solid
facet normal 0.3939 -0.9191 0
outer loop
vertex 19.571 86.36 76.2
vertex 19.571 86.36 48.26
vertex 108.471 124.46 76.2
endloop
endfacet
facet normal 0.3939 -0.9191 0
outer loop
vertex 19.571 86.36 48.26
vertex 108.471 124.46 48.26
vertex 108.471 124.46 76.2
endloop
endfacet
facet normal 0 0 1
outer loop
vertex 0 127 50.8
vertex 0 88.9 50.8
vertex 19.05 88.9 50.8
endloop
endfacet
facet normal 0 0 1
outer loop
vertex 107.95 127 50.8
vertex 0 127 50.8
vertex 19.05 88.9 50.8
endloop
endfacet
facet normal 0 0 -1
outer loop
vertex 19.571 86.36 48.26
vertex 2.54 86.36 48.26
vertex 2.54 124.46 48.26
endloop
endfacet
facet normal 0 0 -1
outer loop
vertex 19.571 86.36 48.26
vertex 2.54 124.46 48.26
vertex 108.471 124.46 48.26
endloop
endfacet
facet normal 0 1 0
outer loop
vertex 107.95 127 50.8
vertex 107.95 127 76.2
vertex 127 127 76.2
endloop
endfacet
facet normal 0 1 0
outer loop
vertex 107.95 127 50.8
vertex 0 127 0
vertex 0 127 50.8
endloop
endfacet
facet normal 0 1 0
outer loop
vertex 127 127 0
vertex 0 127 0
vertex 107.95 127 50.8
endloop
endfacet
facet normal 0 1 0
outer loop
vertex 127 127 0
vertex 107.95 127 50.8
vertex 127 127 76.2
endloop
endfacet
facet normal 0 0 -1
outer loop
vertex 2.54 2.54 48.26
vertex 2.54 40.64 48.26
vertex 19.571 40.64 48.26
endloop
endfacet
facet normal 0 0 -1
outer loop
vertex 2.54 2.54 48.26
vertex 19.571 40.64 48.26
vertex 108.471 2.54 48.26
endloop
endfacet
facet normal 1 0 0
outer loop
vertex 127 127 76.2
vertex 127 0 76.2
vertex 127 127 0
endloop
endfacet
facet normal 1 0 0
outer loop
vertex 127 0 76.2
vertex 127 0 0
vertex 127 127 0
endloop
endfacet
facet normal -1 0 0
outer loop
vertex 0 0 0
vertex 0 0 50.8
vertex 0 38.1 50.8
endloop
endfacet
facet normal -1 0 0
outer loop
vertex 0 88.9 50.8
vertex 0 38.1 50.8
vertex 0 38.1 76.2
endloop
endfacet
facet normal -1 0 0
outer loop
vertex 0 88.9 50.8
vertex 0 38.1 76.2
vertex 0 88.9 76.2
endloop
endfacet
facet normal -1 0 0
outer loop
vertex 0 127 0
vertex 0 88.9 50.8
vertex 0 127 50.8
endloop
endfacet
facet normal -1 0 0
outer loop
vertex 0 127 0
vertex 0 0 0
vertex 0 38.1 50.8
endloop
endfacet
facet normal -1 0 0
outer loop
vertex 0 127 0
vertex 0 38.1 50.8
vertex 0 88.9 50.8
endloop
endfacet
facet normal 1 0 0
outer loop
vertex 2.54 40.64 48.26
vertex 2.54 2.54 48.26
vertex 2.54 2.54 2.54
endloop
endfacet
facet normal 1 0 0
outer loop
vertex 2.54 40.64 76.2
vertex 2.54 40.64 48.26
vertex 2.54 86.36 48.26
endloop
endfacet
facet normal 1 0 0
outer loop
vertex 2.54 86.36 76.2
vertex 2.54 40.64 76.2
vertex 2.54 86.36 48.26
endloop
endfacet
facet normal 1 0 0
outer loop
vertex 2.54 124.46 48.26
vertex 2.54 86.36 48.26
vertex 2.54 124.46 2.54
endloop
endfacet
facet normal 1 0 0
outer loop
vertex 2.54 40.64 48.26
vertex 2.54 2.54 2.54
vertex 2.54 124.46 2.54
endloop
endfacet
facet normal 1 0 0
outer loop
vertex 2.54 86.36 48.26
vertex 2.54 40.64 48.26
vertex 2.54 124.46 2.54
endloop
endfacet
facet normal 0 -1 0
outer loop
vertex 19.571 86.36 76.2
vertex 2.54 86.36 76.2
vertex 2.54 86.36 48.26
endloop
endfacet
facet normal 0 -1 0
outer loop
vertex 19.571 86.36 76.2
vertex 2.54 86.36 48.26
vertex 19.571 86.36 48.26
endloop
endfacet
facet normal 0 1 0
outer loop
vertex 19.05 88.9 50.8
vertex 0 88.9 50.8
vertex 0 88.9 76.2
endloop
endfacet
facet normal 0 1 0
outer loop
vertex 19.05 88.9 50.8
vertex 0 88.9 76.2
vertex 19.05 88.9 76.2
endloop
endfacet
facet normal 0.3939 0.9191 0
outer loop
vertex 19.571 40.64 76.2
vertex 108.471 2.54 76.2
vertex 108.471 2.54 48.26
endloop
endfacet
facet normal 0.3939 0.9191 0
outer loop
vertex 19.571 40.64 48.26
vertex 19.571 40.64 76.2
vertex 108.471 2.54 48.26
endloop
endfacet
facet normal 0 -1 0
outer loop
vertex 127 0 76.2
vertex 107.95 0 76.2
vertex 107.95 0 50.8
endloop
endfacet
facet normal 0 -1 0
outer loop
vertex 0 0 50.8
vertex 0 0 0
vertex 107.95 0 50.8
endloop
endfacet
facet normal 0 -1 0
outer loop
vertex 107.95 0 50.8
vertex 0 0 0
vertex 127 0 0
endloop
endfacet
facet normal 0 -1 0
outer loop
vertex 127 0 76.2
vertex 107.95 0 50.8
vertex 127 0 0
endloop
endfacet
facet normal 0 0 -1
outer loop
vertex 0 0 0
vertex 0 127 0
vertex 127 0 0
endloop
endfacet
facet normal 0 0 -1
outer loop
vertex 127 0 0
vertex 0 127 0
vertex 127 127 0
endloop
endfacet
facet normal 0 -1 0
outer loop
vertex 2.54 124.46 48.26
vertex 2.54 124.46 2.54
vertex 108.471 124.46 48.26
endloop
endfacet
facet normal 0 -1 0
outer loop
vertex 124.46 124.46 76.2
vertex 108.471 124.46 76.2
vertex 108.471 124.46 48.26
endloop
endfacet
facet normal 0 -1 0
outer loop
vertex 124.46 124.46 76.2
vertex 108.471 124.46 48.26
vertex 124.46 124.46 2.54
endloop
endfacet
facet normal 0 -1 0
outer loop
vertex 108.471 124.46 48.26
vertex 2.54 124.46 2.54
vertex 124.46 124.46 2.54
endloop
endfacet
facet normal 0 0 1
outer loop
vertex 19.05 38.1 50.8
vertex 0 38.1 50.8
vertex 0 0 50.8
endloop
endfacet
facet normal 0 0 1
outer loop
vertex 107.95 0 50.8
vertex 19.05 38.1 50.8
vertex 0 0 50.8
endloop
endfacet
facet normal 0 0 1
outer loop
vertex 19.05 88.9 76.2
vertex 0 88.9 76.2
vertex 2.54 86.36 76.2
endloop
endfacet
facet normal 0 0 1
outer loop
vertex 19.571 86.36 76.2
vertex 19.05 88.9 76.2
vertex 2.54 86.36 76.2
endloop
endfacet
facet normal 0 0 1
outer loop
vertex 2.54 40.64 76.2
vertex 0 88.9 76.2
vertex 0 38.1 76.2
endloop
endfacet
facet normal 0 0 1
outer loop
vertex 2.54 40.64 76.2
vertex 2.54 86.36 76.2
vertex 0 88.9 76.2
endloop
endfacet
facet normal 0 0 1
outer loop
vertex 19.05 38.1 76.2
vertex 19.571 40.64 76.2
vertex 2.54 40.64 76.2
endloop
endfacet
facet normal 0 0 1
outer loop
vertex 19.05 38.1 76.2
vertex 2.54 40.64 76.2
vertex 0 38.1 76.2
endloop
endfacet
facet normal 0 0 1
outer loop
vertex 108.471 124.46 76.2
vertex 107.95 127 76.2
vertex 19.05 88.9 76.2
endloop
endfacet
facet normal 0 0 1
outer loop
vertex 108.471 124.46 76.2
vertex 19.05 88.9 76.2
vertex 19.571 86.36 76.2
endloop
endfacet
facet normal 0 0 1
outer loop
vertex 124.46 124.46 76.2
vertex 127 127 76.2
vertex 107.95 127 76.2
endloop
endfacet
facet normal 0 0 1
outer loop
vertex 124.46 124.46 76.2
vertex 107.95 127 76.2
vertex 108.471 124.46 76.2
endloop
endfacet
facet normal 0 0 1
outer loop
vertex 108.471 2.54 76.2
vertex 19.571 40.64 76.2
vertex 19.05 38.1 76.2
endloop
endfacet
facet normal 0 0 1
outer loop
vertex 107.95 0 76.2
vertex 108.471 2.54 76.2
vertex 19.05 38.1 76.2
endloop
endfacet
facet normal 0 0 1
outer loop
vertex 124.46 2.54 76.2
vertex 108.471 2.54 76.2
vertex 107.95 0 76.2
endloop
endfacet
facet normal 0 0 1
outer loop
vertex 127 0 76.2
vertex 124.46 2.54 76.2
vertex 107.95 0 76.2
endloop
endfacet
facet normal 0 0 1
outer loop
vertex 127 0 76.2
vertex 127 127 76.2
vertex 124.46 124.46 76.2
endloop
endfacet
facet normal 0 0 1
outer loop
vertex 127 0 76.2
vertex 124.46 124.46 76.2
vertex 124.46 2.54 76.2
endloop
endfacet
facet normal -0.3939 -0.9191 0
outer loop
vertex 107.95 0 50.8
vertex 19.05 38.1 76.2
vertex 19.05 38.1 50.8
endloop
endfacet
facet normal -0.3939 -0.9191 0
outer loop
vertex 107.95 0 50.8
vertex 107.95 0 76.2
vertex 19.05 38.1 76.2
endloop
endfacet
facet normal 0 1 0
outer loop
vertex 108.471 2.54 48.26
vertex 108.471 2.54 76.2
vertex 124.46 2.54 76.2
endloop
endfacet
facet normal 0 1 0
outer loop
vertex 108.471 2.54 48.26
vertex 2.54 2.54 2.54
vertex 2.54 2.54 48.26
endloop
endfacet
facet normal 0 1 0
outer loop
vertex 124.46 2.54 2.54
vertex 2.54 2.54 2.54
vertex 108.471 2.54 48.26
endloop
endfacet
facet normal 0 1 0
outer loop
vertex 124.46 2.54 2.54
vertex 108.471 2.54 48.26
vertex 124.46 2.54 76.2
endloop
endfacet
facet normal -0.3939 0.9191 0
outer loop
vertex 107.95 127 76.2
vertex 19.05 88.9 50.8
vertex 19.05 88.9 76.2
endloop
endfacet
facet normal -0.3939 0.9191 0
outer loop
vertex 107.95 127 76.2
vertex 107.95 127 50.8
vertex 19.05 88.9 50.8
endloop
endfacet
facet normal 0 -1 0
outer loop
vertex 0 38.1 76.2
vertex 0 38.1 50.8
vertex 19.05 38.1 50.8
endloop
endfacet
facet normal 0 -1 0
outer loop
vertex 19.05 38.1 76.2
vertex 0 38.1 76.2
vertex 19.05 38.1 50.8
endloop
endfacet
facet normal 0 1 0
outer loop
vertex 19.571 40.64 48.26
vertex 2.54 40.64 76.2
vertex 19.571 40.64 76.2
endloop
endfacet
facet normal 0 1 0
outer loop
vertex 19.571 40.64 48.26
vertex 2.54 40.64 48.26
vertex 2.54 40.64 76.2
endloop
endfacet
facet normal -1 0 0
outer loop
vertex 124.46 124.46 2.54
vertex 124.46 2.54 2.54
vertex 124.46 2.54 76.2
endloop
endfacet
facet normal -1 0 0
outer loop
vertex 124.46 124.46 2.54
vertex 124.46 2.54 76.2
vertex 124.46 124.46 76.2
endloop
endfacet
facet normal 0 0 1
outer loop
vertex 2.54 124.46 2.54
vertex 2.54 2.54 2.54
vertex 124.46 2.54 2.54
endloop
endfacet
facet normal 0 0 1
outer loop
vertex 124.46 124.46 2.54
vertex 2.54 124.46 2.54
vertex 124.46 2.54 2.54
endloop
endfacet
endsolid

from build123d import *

# Parameters (mm, degrees)
F0_W       = 127
F0_H       = 127
F1_DEPTH   = 50.8
F2_W       = 19.05
F2_H       = 50.8
F2_H_2     = 127
F3_DEPTH   = 25.4
F3_FACE_W  = 50.8
F3_FACE_H  = 25.4
F3_FACE1_W = 127
F3_FACE1_H = 25.4
F5_T       = -2.54


with BuildPart() as f1:
    # F0 (on Top) → F1 (new body)
    with BuildSketch(Plane.XY):
        with Locations((63.5, 63.5)):
            Rectangle(F0_W, F0_H)
    extrude(amount=F1_DEPTH)

    # F2 (on face) → F3 (join)
    with BuildSketch(Plane.XY.offset(50.8)):
        with Locations((9.525, 63.5)):
            Rectangle(F2_W, F2_H)
        with Locations((117.475, 63.5)):
            Rectangle(F2_W, F2_H_2)
    extrude(amount=F3_DEPTH)

    # F3_face (on face) → F4 section 0
    with BuildSketch(Plane(origin=(19.05, 63.5, 63.5), x_dir=(0, 1, 0), z_dir=(1, 0, 0))):
        Rectangle(F3_FACE_W, F3_FACE_H)
    # F3_face1 (on face) → F4 section 1
    with BuildSketch(Plane(origin=(107.95, 63.5, 63.5), x_dir=(0, -1, 0), z_dir=(-1, 0, 0))):
        Rectangle(F3_FACE1_W, F3_FACE1_H)
    loft()

    # F5
    f5_openings = [f1.faces().sort_by_distance(p)[0] for p in [
        (74.884643, 63.5, 76.2),
    ]]
    offset(amount=F5_T, openings=f5_openings, kind=Kind.INTERSECTION)


solid = f1.part
